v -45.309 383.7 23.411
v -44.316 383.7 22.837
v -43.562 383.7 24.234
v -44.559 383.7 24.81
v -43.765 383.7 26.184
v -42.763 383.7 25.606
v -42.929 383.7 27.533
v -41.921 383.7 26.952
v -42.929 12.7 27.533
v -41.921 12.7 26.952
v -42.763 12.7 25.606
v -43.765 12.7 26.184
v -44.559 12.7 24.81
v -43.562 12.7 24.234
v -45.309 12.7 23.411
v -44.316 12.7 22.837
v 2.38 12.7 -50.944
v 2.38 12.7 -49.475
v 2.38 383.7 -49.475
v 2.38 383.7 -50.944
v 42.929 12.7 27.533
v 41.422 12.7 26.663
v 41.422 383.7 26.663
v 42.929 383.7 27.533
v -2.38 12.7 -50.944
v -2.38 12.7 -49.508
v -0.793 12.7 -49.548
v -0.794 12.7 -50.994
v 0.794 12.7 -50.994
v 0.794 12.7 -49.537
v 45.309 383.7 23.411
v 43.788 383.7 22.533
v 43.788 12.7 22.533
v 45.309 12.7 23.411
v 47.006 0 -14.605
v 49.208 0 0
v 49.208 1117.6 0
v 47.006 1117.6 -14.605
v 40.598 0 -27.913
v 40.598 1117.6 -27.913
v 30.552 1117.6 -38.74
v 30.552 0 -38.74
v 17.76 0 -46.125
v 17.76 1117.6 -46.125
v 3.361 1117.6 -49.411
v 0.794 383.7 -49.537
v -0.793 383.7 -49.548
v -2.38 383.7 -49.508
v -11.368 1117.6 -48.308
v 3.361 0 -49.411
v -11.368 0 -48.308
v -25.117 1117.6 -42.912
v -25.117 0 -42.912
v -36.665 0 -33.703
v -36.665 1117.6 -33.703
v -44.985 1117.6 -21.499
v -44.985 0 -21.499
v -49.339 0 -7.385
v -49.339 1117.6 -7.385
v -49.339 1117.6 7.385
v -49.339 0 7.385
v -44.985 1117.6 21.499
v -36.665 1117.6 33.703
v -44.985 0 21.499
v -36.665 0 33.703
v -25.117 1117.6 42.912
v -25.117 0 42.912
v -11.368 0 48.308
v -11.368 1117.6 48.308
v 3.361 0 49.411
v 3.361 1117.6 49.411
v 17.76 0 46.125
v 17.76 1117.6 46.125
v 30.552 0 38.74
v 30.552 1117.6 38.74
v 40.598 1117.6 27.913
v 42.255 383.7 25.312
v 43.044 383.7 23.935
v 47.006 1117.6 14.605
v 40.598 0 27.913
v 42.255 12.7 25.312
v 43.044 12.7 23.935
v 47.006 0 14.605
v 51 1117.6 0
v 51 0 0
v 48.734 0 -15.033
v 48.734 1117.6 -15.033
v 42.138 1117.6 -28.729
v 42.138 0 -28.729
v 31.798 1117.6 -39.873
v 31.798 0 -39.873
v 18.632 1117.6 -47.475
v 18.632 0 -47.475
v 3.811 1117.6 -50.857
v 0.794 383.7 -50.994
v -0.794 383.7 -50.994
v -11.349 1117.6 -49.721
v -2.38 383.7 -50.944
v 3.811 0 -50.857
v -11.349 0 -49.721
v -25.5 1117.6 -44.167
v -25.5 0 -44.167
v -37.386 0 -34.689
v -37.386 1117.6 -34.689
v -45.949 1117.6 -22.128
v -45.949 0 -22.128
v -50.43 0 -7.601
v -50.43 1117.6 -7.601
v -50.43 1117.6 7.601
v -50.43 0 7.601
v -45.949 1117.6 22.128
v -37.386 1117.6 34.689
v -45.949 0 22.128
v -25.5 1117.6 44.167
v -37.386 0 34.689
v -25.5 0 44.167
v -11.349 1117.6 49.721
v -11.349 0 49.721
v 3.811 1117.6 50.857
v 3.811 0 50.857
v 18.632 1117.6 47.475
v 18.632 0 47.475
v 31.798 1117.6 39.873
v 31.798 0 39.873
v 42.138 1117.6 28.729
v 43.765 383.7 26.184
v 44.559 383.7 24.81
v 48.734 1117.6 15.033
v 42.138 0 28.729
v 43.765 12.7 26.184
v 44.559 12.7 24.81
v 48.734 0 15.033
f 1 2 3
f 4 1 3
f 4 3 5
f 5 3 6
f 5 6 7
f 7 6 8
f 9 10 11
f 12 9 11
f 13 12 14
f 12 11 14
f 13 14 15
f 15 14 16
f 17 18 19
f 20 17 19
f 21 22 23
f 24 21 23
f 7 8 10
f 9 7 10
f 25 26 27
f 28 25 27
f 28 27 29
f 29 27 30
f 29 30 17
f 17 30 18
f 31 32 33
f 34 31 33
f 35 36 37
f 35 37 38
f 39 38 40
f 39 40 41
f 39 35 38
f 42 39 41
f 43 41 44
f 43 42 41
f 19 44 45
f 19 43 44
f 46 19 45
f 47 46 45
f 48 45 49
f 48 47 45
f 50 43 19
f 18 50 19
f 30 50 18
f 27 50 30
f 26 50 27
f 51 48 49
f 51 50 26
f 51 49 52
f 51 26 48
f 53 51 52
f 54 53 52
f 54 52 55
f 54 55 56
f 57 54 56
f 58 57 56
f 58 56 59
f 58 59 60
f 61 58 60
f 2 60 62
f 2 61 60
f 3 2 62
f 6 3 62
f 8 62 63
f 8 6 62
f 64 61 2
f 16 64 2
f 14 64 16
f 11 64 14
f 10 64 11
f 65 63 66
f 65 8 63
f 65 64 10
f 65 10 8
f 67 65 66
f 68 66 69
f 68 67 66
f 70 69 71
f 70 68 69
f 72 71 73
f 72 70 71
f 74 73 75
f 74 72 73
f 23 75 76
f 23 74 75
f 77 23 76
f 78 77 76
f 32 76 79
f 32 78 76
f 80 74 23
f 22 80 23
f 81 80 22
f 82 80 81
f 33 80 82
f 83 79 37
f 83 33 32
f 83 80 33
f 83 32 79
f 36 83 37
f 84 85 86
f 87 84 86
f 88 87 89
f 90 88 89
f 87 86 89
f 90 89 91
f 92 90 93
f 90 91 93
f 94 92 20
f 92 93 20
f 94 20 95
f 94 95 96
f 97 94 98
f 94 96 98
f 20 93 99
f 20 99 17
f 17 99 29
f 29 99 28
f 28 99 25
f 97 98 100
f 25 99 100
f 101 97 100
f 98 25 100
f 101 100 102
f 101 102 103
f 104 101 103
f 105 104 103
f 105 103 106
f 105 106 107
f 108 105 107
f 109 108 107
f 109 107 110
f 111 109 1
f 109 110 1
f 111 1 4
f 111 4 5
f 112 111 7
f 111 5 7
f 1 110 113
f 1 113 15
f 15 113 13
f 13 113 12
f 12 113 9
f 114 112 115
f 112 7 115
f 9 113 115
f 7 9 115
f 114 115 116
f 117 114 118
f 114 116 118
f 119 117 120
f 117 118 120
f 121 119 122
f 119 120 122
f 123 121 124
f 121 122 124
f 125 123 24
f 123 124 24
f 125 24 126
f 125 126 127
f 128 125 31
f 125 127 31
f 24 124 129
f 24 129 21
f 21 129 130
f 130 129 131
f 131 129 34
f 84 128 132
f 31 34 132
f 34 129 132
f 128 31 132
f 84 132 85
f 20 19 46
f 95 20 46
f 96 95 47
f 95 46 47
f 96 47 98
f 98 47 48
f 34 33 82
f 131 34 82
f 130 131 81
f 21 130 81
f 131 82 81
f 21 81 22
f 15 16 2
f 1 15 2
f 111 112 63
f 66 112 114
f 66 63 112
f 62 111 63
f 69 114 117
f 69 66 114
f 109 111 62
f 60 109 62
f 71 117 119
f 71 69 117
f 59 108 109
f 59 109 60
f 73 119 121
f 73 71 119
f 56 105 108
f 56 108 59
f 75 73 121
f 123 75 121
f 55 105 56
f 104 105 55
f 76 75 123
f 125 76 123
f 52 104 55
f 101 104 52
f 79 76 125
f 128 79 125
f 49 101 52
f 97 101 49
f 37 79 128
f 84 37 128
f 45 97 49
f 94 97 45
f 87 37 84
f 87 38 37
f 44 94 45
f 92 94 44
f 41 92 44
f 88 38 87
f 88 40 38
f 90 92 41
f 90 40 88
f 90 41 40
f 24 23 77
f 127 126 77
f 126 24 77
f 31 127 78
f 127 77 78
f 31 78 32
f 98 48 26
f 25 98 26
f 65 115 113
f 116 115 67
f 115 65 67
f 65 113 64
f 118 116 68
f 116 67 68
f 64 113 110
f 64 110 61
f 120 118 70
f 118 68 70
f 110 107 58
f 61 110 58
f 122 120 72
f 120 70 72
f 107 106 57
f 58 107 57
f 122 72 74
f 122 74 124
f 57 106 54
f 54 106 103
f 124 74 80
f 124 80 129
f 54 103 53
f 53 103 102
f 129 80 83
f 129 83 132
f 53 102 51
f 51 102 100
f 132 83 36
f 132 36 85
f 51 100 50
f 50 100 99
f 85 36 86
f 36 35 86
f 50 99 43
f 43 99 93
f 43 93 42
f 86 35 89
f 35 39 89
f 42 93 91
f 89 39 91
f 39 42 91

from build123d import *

# Parameters (mm, degrees)
SKETCH1_R           = 51
SKETCH1_R_2         = 49.55
BOSS_EXTRUDE1_DEPTH = 1117.6
CUT_EXTRUDE1_DEPTH  = 52
CIRPATTERN1_COUNT   = 3


with BuildPart() as part:
    # Sketch1 → Boss-Extrude1 (new body)
    with BuildSketch(Plane(origin=(0, 0, 0), x_dir=(1, 0, 0), z_dir=(0, 1, 0))):
        Circle(SKETCH1_R)
        with Locations((-0.342312985, 0)):
            Circle(SKETCH1_R_2, mode=Mode.SUBTRACT)
    extrude(amount=BOSS_EXTRUDE1_DEPTH)

    # Sketch2 → Cut-Extrude1 (cut, through all)
    with BuildSketch(Plane.XY):
        Polygon((0, 12.7), (2.38, 12.7), (2.38, 383.7), (-2.38, 383.7), (-2.38, 12.7), align=None)
    cut_extrude1 = extrude(amount=-CUT_EXTRUDE1_DEPTH, mode=Mode.SUBTRACT)

    # CirPattern1: Cut-Extrude1 ×3 about axis
    cirpattern1_axis = Axis((0, 0, 0), (0, 1, 0))
    for i in range(1, CIRPATTERN1_COUNT):
        add(cut_extrude1.rotate(cirpattern1_axis, i * 360 / CIRPATTERN1_COUNT), mode=Mode.SUBTRACT)


solid = part.part
